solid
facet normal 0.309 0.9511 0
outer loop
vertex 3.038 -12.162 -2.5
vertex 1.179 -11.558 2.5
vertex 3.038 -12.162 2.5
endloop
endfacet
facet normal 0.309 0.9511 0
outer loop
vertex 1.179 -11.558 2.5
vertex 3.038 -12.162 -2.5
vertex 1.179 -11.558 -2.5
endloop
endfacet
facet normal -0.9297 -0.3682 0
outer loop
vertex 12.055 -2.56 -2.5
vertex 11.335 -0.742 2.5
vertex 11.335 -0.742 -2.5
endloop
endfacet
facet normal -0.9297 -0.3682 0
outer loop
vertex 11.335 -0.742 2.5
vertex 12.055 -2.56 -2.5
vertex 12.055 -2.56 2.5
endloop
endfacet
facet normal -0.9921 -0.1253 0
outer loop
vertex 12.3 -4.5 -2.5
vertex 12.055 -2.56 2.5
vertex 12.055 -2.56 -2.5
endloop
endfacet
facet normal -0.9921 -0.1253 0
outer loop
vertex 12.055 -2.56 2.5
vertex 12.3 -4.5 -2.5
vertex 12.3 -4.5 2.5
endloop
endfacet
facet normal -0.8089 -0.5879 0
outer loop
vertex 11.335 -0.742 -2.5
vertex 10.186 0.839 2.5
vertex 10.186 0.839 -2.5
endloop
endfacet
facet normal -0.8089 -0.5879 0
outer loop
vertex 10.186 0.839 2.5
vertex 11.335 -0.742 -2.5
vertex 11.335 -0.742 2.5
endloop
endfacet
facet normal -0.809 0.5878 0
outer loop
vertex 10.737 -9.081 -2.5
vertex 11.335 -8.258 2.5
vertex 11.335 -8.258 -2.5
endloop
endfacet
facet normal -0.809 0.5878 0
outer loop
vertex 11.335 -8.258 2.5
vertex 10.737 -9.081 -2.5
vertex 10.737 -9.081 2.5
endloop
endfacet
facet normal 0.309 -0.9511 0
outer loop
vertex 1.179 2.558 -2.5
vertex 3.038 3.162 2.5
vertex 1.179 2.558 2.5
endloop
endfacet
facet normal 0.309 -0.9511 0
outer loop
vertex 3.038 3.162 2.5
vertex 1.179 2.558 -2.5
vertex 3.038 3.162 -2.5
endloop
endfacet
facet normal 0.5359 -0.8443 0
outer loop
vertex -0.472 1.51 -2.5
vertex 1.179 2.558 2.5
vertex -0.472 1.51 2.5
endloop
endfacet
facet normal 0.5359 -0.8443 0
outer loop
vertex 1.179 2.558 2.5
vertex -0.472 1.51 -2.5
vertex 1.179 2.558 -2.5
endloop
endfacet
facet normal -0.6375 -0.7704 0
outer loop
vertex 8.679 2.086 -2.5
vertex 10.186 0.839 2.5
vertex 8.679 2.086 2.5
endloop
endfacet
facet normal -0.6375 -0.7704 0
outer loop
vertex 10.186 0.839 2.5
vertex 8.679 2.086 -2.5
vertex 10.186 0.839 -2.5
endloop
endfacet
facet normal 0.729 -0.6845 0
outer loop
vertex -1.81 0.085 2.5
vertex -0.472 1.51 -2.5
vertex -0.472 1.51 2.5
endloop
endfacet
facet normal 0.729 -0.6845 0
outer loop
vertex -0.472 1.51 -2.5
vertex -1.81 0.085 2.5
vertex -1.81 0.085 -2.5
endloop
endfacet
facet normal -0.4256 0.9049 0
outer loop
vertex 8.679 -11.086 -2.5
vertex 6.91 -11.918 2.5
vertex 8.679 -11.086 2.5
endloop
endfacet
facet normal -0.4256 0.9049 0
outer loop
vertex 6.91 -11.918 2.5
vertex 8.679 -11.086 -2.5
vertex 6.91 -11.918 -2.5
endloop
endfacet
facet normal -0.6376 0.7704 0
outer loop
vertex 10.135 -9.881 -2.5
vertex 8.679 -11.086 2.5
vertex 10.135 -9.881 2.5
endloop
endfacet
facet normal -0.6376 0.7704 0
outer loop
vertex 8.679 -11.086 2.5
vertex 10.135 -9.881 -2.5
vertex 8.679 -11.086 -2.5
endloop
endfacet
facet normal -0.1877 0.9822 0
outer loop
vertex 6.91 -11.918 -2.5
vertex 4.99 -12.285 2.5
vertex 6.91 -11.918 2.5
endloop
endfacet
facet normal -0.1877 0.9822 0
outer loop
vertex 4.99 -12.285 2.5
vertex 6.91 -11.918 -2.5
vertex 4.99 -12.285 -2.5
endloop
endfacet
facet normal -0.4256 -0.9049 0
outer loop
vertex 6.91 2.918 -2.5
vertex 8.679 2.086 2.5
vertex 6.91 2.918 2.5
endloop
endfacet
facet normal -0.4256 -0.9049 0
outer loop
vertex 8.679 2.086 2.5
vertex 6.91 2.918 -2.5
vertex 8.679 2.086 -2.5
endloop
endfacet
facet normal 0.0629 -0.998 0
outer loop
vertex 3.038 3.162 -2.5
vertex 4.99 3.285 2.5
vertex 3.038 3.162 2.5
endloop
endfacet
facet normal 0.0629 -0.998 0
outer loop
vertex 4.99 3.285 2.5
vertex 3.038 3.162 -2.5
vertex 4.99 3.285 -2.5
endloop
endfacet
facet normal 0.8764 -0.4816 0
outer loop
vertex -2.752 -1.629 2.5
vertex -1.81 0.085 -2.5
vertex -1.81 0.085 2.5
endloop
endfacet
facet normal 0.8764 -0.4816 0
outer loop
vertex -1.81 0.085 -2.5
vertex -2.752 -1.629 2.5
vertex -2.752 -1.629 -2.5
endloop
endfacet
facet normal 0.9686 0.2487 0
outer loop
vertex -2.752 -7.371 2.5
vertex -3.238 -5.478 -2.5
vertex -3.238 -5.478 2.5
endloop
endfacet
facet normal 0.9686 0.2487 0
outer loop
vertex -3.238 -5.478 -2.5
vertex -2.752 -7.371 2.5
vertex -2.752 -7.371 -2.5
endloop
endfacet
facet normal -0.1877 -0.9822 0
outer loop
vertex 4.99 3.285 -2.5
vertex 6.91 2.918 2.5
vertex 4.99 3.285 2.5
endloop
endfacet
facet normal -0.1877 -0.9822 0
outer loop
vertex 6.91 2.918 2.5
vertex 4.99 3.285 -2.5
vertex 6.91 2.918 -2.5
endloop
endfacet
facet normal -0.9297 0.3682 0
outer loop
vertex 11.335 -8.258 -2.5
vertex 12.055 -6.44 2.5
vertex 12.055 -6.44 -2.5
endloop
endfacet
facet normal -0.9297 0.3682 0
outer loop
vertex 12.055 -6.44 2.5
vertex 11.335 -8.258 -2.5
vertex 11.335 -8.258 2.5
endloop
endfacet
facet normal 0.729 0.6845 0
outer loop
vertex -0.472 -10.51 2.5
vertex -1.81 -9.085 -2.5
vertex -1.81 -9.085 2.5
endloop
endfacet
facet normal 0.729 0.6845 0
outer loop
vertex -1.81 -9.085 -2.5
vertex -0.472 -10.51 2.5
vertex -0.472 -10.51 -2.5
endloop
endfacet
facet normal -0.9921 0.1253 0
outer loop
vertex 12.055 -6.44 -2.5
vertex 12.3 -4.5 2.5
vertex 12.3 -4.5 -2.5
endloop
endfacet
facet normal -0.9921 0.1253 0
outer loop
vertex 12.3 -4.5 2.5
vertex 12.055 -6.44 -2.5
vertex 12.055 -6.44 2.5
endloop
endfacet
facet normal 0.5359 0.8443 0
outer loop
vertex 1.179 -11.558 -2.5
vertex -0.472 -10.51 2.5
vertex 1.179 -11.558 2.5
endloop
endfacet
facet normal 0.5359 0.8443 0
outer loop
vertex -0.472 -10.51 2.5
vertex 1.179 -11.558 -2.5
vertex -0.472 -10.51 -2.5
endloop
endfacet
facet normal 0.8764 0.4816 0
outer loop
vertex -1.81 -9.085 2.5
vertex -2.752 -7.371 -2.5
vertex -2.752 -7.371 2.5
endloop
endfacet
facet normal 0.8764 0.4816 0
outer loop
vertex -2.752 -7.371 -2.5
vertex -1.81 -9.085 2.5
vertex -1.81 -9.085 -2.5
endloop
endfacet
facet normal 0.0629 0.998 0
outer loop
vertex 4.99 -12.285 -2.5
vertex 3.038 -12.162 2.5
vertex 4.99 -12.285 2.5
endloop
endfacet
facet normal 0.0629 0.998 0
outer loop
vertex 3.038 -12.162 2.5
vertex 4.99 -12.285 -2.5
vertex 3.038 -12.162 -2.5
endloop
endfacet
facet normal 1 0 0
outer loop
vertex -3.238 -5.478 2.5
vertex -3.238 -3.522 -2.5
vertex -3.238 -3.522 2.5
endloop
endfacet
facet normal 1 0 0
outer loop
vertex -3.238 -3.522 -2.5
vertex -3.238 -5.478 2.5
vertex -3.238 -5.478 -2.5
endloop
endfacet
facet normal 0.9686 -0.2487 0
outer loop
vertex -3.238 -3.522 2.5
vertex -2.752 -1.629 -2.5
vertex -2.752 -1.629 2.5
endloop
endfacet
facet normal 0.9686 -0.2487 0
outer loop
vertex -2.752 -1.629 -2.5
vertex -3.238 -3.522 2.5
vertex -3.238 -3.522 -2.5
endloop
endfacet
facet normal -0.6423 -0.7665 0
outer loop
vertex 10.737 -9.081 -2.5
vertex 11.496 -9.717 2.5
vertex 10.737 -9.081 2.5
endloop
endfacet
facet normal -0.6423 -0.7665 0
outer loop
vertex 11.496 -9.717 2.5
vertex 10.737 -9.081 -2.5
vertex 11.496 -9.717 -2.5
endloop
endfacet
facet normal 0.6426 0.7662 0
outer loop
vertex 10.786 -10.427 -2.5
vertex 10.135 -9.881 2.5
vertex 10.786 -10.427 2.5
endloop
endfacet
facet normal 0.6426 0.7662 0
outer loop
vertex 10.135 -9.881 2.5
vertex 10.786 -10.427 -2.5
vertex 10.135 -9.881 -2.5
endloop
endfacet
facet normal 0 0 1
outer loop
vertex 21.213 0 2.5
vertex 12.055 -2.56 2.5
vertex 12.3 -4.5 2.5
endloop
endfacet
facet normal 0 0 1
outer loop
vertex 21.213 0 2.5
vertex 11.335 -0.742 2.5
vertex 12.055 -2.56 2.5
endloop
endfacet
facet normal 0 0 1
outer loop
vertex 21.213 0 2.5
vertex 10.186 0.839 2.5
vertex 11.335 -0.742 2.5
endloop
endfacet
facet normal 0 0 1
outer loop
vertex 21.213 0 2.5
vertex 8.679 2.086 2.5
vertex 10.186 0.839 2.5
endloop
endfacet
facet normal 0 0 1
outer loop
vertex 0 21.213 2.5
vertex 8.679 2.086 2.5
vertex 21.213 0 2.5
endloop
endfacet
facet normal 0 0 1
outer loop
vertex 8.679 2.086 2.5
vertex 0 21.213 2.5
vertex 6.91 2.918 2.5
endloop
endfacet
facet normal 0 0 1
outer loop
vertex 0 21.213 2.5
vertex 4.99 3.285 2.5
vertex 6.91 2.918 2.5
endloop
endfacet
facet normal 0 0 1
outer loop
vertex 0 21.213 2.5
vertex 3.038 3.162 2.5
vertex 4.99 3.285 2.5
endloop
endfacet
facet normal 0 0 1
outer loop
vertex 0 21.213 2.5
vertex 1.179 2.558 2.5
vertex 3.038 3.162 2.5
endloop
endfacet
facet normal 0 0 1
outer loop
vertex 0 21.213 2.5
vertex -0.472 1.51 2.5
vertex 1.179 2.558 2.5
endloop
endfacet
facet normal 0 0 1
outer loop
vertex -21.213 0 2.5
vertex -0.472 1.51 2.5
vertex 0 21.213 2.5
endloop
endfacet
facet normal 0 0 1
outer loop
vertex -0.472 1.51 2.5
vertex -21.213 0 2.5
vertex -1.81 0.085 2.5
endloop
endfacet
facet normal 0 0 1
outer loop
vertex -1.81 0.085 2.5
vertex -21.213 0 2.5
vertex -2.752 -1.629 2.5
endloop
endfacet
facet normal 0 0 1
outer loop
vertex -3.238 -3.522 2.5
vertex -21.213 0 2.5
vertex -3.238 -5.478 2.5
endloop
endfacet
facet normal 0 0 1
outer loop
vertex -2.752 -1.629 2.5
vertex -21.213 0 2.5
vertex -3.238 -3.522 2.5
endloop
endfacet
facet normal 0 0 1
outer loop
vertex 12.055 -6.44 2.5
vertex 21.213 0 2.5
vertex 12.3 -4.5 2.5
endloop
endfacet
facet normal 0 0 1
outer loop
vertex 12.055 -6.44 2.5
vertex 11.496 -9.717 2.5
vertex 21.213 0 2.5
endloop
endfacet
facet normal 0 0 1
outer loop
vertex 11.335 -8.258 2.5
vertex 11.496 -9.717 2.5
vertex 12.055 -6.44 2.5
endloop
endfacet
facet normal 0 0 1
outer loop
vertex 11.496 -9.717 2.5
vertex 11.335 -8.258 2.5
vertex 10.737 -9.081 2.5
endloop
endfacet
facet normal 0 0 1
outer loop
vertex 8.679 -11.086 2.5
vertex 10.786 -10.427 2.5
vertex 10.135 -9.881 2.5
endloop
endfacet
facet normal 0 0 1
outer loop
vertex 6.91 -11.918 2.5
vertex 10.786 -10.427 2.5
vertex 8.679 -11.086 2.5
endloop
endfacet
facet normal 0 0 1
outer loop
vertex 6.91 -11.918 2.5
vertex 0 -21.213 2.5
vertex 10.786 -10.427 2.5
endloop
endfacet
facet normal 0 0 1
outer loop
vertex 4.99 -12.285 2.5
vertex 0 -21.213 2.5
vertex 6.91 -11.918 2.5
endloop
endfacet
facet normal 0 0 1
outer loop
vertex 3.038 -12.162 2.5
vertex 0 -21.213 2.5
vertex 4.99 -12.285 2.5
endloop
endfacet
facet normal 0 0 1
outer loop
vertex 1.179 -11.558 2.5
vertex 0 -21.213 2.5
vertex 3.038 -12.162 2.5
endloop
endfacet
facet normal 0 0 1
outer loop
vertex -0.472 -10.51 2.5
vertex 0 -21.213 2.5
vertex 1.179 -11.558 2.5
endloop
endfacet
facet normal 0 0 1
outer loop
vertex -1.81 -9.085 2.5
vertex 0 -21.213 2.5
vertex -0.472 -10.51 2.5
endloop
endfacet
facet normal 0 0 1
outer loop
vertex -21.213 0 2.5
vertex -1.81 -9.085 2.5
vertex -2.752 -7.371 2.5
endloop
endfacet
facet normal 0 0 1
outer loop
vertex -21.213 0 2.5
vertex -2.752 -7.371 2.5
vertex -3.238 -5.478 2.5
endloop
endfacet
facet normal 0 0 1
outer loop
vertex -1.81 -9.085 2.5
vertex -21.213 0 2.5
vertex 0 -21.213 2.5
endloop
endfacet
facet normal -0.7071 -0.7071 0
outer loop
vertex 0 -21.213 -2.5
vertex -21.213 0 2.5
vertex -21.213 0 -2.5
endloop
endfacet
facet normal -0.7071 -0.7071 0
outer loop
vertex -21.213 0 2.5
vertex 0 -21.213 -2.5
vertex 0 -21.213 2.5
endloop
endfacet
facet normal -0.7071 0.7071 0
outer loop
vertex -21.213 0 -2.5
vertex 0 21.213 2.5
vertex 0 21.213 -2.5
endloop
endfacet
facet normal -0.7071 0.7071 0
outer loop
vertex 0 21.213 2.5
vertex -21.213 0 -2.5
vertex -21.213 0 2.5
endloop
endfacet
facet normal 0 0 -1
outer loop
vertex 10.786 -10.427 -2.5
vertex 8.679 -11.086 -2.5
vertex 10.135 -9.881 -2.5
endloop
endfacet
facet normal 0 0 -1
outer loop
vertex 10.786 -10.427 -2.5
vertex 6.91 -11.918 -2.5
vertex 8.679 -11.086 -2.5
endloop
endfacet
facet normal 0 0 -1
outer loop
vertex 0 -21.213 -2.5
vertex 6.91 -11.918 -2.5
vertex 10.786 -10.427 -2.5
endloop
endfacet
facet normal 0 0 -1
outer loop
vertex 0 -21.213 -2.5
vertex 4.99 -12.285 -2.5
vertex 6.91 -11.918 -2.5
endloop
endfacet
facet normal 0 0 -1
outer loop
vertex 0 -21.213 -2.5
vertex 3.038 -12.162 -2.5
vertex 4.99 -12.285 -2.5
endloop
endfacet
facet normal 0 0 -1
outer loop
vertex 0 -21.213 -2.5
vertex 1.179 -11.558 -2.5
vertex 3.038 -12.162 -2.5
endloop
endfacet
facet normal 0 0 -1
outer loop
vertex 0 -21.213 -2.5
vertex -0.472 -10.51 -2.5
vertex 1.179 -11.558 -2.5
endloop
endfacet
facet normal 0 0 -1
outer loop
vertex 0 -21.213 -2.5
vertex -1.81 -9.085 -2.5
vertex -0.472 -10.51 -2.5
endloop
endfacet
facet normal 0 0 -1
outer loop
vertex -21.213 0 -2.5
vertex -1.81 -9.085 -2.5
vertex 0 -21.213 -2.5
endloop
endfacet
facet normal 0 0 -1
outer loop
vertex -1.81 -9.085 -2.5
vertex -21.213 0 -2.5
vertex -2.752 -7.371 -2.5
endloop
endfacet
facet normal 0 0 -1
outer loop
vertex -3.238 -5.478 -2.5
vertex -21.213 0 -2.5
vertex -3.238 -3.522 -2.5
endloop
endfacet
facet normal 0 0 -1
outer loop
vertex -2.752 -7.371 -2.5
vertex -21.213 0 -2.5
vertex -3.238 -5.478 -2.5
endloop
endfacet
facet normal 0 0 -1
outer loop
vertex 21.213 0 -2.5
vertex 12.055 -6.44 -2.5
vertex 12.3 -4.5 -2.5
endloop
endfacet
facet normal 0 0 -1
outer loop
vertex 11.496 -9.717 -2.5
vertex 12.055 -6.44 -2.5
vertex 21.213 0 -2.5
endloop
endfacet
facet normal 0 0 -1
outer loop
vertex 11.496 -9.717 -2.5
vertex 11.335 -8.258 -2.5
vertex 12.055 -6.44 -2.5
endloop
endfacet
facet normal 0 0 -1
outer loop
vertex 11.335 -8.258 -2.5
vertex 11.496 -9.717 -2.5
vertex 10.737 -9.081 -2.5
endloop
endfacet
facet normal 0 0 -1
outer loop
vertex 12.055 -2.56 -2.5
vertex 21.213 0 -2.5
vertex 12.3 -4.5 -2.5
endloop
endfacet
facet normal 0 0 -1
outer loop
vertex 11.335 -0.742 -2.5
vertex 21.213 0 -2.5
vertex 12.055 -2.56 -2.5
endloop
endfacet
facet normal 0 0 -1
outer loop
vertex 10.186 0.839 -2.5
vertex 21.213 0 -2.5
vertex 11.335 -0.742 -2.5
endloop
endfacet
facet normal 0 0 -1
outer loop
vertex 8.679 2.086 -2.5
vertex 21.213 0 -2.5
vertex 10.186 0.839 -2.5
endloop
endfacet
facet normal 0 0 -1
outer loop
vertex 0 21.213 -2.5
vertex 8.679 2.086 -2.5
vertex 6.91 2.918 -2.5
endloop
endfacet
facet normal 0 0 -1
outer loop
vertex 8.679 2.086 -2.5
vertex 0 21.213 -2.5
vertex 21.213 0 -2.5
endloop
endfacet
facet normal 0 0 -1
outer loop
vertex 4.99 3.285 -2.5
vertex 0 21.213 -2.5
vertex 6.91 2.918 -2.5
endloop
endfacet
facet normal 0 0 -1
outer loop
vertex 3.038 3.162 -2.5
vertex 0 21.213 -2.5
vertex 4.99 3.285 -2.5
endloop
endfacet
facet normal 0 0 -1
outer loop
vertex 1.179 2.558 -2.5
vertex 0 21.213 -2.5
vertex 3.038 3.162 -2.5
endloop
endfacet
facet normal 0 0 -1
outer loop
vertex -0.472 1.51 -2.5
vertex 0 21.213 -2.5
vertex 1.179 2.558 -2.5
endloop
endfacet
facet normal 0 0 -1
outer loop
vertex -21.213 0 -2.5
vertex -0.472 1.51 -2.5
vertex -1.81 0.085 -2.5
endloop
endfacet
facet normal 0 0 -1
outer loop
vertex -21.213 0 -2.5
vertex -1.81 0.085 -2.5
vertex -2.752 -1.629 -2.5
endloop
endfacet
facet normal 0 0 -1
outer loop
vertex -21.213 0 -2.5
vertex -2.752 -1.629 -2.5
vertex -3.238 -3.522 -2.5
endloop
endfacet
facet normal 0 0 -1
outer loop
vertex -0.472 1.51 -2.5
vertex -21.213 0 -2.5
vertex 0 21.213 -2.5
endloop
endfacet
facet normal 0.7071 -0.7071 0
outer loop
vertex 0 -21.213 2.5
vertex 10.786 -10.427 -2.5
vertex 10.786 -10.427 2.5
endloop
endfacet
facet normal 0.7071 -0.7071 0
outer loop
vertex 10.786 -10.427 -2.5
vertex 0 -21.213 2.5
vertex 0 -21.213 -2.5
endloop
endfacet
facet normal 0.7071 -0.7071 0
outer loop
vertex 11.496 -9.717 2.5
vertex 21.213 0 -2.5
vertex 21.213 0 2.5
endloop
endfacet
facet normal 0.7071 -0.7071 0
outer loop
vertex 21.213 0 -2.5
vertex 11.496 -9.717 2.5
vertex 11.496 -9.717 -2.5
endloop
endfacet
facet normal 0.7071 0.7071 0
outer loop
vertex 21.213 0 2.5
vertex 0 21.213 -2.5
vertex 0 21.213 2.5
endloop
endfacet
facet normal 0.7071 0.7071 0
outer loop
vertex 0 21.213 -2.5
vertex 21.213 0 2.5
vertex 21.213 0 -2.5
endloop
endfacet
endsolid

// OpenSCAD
// file: polyholes.scad
//
// Mendel90
//
// GNU GPL v2
// nop.head@gmail.com
// hydraraptor.blogspot.com
//
// See http://hydraraptor.blogspot.com/2011/02/polyholes.html
//
function sides(r) = max(round(4 *r),3);
function correctedRadius(r,n) = 0.1 + r / cos(180 / n);
function correctedDiameter(d) = 0.2 + d / cos(180 / sides(d / 2));

module polyCircle(r, center = false) {
    n = sides(r);
    circle(r = correctedRadius(r,n), $fn = n, center = center);
}

module poly_circle(r, center = false) {
	polyCircle(r, center);
}

module polyCylinder(r, h, center = false) {
    n = sides(r);
    cylinder(h = h, r = correctedRadius(r,n), $fn = n, center = center);
}

module poly_cylinder(r, h, center = false) {
	polyCylinder(r,h,center);
}

module polydCylinder(r, center = false) {
    n = sides(r);
    r = correctedRadius(r,n);
    cylinder(h = h, r = r, $fn = n, center = center);
    translate([0, -r, 0])
        cube([r, 2 * r, h]);
}

module poly_d_cylinder(r, center = false) {
	polydCylinder(r,center);
}
// file: bearing.scad
// PRUSA iteration3
// Bearing holders
// GNU GPL v3
// Josef Průša <iam@josefprusa.cz> and contributors
// http://www.reprap.org/wiki/Prusa_Mendel
// http://prusamendel.org

use <polyholes.scad>

bearing_diameter = 14.95;

module horizontal_bearing_base(bearings=1){
 translate(v=[0,0,6]) cube(size = [24,8+bearings*25,12], center = true);	
}

module horizontal_bearing_holes(bearings=1){
 cutter_lenght = 10+bearings*25;
 one_holder_lenght = 8+25;
 holder_lenght = 8+bearings*25;
 
 // Main bearing cut
 difference(){
  translate(v=[0,0,12]) rotate(a=[90,0,0]) translate(v=[0,0,-cutter_lenght/2]) cylinder(h = cutter_lenght, r=(bearing_diameter/2)+0.2, $fn=50);
  // Bearing retainers
  translate(v=[0,1-holder_lenght/2,3]) cube(size = [24,6,8], center = true);
  translate(v=[0,-1+holder_lenght/2,3]) cube(size = [24,6,8], center = true);
 }
 
 // Ziptie cutouts
 ziptie_cut_ofset = 0;
 for ( i = [0 : bearings-1] ){
  // For easier positioning I move them by half of one 
  // bearing holder then add each bearign lenght and then center again
  translate(v=[0,-holder_lenght/2,0]) translate(v=[0,one_holder_lenght/2+i*25,0]) difference(){
   union(){
    translate(v=[0,2-8.5,12]) rotate(a=[90,0,0]) translate(v=[0,0,0]) cylinder(h = 4, r=11.5, $fn=50);
    translate(v=[0,2+8.5,12]) rotate(a=[90,0,0]) translate(v=[0,0,0]) cylinder(h = 4, r=11.5, $fn=50);
   }
   translate(v=[0,12,12]) rotate(a=[90,0,0]) translate(v=[0,0,0]) cylinder(h = 24, r=9, $fn=50);
  }
 }
 
}
 
module horizontal_bearing_holes_nozip(bearings=1){
 cutter_lenght = 10+bearings*25;
 one_holder_lenght = 8+25;
 holder_lenght = 8+bearings*25;
 
 // Main bearing cut
 difference(){
  translate(v=[0,0,12]) rotate(a=[90,0,0]) translate(v=[0,0,-cutter_lenght/2]) cylinder(h = cutter_lenght, r=(bearing_diameter/2)+0.2, $fn=50);
  // Bearing retainers
  translate(v=[0,1-holder_lenght/2,3]) cube(size = [24,6,8], center = true);
  translate(v=[0,-1+holder_lenght/2,3]) cube(size = [24,6,8], center = true);
 }
 
}


thinwall = 3;
bearing_size = bearing_diameter + 2 * thinwall;

module vertical_bearing_base(){
 translate(v=[-2-bearing_size/4,0,29]) cube(size = [4+bearing_size/2,bearing_size,58], center = true);
 cylinder(h = 58, r=bearing_size/2, $fn = 90);
}

module vertical_bearing_holes(){
  translate(v=[0,0,-1]) cylinder(h = 62, d=15.6); // NV: increased size
  translate(v=[0,0,-0.1]) cylinder(r1=(bearing_diameter/2)+0.7,r2=(bearing_diameter/2), h=0.5);
  rotate(a=[0,0,-40]) translate(v=[bearing_diameter/2-2.9,-0.5,0.5]) cube(size = [thinwall*2,1,62]);

}

//difference(){
//vertical_bearing_base();
vertical_bearing_holes();
//}
//horizontal_bearing_test();
//horizontal_bearing_base(1);
//horizontal_bearing_holes(1);
//horizontal_bearing_holes_nozip(1);
// main file
use <bearing.scad>

difference() {
    
    rotate([0,0,45]) cube([30,30,5], center=true);
    translate([4.5,-4.5,-4]) vertical_bearing_holes();
}
